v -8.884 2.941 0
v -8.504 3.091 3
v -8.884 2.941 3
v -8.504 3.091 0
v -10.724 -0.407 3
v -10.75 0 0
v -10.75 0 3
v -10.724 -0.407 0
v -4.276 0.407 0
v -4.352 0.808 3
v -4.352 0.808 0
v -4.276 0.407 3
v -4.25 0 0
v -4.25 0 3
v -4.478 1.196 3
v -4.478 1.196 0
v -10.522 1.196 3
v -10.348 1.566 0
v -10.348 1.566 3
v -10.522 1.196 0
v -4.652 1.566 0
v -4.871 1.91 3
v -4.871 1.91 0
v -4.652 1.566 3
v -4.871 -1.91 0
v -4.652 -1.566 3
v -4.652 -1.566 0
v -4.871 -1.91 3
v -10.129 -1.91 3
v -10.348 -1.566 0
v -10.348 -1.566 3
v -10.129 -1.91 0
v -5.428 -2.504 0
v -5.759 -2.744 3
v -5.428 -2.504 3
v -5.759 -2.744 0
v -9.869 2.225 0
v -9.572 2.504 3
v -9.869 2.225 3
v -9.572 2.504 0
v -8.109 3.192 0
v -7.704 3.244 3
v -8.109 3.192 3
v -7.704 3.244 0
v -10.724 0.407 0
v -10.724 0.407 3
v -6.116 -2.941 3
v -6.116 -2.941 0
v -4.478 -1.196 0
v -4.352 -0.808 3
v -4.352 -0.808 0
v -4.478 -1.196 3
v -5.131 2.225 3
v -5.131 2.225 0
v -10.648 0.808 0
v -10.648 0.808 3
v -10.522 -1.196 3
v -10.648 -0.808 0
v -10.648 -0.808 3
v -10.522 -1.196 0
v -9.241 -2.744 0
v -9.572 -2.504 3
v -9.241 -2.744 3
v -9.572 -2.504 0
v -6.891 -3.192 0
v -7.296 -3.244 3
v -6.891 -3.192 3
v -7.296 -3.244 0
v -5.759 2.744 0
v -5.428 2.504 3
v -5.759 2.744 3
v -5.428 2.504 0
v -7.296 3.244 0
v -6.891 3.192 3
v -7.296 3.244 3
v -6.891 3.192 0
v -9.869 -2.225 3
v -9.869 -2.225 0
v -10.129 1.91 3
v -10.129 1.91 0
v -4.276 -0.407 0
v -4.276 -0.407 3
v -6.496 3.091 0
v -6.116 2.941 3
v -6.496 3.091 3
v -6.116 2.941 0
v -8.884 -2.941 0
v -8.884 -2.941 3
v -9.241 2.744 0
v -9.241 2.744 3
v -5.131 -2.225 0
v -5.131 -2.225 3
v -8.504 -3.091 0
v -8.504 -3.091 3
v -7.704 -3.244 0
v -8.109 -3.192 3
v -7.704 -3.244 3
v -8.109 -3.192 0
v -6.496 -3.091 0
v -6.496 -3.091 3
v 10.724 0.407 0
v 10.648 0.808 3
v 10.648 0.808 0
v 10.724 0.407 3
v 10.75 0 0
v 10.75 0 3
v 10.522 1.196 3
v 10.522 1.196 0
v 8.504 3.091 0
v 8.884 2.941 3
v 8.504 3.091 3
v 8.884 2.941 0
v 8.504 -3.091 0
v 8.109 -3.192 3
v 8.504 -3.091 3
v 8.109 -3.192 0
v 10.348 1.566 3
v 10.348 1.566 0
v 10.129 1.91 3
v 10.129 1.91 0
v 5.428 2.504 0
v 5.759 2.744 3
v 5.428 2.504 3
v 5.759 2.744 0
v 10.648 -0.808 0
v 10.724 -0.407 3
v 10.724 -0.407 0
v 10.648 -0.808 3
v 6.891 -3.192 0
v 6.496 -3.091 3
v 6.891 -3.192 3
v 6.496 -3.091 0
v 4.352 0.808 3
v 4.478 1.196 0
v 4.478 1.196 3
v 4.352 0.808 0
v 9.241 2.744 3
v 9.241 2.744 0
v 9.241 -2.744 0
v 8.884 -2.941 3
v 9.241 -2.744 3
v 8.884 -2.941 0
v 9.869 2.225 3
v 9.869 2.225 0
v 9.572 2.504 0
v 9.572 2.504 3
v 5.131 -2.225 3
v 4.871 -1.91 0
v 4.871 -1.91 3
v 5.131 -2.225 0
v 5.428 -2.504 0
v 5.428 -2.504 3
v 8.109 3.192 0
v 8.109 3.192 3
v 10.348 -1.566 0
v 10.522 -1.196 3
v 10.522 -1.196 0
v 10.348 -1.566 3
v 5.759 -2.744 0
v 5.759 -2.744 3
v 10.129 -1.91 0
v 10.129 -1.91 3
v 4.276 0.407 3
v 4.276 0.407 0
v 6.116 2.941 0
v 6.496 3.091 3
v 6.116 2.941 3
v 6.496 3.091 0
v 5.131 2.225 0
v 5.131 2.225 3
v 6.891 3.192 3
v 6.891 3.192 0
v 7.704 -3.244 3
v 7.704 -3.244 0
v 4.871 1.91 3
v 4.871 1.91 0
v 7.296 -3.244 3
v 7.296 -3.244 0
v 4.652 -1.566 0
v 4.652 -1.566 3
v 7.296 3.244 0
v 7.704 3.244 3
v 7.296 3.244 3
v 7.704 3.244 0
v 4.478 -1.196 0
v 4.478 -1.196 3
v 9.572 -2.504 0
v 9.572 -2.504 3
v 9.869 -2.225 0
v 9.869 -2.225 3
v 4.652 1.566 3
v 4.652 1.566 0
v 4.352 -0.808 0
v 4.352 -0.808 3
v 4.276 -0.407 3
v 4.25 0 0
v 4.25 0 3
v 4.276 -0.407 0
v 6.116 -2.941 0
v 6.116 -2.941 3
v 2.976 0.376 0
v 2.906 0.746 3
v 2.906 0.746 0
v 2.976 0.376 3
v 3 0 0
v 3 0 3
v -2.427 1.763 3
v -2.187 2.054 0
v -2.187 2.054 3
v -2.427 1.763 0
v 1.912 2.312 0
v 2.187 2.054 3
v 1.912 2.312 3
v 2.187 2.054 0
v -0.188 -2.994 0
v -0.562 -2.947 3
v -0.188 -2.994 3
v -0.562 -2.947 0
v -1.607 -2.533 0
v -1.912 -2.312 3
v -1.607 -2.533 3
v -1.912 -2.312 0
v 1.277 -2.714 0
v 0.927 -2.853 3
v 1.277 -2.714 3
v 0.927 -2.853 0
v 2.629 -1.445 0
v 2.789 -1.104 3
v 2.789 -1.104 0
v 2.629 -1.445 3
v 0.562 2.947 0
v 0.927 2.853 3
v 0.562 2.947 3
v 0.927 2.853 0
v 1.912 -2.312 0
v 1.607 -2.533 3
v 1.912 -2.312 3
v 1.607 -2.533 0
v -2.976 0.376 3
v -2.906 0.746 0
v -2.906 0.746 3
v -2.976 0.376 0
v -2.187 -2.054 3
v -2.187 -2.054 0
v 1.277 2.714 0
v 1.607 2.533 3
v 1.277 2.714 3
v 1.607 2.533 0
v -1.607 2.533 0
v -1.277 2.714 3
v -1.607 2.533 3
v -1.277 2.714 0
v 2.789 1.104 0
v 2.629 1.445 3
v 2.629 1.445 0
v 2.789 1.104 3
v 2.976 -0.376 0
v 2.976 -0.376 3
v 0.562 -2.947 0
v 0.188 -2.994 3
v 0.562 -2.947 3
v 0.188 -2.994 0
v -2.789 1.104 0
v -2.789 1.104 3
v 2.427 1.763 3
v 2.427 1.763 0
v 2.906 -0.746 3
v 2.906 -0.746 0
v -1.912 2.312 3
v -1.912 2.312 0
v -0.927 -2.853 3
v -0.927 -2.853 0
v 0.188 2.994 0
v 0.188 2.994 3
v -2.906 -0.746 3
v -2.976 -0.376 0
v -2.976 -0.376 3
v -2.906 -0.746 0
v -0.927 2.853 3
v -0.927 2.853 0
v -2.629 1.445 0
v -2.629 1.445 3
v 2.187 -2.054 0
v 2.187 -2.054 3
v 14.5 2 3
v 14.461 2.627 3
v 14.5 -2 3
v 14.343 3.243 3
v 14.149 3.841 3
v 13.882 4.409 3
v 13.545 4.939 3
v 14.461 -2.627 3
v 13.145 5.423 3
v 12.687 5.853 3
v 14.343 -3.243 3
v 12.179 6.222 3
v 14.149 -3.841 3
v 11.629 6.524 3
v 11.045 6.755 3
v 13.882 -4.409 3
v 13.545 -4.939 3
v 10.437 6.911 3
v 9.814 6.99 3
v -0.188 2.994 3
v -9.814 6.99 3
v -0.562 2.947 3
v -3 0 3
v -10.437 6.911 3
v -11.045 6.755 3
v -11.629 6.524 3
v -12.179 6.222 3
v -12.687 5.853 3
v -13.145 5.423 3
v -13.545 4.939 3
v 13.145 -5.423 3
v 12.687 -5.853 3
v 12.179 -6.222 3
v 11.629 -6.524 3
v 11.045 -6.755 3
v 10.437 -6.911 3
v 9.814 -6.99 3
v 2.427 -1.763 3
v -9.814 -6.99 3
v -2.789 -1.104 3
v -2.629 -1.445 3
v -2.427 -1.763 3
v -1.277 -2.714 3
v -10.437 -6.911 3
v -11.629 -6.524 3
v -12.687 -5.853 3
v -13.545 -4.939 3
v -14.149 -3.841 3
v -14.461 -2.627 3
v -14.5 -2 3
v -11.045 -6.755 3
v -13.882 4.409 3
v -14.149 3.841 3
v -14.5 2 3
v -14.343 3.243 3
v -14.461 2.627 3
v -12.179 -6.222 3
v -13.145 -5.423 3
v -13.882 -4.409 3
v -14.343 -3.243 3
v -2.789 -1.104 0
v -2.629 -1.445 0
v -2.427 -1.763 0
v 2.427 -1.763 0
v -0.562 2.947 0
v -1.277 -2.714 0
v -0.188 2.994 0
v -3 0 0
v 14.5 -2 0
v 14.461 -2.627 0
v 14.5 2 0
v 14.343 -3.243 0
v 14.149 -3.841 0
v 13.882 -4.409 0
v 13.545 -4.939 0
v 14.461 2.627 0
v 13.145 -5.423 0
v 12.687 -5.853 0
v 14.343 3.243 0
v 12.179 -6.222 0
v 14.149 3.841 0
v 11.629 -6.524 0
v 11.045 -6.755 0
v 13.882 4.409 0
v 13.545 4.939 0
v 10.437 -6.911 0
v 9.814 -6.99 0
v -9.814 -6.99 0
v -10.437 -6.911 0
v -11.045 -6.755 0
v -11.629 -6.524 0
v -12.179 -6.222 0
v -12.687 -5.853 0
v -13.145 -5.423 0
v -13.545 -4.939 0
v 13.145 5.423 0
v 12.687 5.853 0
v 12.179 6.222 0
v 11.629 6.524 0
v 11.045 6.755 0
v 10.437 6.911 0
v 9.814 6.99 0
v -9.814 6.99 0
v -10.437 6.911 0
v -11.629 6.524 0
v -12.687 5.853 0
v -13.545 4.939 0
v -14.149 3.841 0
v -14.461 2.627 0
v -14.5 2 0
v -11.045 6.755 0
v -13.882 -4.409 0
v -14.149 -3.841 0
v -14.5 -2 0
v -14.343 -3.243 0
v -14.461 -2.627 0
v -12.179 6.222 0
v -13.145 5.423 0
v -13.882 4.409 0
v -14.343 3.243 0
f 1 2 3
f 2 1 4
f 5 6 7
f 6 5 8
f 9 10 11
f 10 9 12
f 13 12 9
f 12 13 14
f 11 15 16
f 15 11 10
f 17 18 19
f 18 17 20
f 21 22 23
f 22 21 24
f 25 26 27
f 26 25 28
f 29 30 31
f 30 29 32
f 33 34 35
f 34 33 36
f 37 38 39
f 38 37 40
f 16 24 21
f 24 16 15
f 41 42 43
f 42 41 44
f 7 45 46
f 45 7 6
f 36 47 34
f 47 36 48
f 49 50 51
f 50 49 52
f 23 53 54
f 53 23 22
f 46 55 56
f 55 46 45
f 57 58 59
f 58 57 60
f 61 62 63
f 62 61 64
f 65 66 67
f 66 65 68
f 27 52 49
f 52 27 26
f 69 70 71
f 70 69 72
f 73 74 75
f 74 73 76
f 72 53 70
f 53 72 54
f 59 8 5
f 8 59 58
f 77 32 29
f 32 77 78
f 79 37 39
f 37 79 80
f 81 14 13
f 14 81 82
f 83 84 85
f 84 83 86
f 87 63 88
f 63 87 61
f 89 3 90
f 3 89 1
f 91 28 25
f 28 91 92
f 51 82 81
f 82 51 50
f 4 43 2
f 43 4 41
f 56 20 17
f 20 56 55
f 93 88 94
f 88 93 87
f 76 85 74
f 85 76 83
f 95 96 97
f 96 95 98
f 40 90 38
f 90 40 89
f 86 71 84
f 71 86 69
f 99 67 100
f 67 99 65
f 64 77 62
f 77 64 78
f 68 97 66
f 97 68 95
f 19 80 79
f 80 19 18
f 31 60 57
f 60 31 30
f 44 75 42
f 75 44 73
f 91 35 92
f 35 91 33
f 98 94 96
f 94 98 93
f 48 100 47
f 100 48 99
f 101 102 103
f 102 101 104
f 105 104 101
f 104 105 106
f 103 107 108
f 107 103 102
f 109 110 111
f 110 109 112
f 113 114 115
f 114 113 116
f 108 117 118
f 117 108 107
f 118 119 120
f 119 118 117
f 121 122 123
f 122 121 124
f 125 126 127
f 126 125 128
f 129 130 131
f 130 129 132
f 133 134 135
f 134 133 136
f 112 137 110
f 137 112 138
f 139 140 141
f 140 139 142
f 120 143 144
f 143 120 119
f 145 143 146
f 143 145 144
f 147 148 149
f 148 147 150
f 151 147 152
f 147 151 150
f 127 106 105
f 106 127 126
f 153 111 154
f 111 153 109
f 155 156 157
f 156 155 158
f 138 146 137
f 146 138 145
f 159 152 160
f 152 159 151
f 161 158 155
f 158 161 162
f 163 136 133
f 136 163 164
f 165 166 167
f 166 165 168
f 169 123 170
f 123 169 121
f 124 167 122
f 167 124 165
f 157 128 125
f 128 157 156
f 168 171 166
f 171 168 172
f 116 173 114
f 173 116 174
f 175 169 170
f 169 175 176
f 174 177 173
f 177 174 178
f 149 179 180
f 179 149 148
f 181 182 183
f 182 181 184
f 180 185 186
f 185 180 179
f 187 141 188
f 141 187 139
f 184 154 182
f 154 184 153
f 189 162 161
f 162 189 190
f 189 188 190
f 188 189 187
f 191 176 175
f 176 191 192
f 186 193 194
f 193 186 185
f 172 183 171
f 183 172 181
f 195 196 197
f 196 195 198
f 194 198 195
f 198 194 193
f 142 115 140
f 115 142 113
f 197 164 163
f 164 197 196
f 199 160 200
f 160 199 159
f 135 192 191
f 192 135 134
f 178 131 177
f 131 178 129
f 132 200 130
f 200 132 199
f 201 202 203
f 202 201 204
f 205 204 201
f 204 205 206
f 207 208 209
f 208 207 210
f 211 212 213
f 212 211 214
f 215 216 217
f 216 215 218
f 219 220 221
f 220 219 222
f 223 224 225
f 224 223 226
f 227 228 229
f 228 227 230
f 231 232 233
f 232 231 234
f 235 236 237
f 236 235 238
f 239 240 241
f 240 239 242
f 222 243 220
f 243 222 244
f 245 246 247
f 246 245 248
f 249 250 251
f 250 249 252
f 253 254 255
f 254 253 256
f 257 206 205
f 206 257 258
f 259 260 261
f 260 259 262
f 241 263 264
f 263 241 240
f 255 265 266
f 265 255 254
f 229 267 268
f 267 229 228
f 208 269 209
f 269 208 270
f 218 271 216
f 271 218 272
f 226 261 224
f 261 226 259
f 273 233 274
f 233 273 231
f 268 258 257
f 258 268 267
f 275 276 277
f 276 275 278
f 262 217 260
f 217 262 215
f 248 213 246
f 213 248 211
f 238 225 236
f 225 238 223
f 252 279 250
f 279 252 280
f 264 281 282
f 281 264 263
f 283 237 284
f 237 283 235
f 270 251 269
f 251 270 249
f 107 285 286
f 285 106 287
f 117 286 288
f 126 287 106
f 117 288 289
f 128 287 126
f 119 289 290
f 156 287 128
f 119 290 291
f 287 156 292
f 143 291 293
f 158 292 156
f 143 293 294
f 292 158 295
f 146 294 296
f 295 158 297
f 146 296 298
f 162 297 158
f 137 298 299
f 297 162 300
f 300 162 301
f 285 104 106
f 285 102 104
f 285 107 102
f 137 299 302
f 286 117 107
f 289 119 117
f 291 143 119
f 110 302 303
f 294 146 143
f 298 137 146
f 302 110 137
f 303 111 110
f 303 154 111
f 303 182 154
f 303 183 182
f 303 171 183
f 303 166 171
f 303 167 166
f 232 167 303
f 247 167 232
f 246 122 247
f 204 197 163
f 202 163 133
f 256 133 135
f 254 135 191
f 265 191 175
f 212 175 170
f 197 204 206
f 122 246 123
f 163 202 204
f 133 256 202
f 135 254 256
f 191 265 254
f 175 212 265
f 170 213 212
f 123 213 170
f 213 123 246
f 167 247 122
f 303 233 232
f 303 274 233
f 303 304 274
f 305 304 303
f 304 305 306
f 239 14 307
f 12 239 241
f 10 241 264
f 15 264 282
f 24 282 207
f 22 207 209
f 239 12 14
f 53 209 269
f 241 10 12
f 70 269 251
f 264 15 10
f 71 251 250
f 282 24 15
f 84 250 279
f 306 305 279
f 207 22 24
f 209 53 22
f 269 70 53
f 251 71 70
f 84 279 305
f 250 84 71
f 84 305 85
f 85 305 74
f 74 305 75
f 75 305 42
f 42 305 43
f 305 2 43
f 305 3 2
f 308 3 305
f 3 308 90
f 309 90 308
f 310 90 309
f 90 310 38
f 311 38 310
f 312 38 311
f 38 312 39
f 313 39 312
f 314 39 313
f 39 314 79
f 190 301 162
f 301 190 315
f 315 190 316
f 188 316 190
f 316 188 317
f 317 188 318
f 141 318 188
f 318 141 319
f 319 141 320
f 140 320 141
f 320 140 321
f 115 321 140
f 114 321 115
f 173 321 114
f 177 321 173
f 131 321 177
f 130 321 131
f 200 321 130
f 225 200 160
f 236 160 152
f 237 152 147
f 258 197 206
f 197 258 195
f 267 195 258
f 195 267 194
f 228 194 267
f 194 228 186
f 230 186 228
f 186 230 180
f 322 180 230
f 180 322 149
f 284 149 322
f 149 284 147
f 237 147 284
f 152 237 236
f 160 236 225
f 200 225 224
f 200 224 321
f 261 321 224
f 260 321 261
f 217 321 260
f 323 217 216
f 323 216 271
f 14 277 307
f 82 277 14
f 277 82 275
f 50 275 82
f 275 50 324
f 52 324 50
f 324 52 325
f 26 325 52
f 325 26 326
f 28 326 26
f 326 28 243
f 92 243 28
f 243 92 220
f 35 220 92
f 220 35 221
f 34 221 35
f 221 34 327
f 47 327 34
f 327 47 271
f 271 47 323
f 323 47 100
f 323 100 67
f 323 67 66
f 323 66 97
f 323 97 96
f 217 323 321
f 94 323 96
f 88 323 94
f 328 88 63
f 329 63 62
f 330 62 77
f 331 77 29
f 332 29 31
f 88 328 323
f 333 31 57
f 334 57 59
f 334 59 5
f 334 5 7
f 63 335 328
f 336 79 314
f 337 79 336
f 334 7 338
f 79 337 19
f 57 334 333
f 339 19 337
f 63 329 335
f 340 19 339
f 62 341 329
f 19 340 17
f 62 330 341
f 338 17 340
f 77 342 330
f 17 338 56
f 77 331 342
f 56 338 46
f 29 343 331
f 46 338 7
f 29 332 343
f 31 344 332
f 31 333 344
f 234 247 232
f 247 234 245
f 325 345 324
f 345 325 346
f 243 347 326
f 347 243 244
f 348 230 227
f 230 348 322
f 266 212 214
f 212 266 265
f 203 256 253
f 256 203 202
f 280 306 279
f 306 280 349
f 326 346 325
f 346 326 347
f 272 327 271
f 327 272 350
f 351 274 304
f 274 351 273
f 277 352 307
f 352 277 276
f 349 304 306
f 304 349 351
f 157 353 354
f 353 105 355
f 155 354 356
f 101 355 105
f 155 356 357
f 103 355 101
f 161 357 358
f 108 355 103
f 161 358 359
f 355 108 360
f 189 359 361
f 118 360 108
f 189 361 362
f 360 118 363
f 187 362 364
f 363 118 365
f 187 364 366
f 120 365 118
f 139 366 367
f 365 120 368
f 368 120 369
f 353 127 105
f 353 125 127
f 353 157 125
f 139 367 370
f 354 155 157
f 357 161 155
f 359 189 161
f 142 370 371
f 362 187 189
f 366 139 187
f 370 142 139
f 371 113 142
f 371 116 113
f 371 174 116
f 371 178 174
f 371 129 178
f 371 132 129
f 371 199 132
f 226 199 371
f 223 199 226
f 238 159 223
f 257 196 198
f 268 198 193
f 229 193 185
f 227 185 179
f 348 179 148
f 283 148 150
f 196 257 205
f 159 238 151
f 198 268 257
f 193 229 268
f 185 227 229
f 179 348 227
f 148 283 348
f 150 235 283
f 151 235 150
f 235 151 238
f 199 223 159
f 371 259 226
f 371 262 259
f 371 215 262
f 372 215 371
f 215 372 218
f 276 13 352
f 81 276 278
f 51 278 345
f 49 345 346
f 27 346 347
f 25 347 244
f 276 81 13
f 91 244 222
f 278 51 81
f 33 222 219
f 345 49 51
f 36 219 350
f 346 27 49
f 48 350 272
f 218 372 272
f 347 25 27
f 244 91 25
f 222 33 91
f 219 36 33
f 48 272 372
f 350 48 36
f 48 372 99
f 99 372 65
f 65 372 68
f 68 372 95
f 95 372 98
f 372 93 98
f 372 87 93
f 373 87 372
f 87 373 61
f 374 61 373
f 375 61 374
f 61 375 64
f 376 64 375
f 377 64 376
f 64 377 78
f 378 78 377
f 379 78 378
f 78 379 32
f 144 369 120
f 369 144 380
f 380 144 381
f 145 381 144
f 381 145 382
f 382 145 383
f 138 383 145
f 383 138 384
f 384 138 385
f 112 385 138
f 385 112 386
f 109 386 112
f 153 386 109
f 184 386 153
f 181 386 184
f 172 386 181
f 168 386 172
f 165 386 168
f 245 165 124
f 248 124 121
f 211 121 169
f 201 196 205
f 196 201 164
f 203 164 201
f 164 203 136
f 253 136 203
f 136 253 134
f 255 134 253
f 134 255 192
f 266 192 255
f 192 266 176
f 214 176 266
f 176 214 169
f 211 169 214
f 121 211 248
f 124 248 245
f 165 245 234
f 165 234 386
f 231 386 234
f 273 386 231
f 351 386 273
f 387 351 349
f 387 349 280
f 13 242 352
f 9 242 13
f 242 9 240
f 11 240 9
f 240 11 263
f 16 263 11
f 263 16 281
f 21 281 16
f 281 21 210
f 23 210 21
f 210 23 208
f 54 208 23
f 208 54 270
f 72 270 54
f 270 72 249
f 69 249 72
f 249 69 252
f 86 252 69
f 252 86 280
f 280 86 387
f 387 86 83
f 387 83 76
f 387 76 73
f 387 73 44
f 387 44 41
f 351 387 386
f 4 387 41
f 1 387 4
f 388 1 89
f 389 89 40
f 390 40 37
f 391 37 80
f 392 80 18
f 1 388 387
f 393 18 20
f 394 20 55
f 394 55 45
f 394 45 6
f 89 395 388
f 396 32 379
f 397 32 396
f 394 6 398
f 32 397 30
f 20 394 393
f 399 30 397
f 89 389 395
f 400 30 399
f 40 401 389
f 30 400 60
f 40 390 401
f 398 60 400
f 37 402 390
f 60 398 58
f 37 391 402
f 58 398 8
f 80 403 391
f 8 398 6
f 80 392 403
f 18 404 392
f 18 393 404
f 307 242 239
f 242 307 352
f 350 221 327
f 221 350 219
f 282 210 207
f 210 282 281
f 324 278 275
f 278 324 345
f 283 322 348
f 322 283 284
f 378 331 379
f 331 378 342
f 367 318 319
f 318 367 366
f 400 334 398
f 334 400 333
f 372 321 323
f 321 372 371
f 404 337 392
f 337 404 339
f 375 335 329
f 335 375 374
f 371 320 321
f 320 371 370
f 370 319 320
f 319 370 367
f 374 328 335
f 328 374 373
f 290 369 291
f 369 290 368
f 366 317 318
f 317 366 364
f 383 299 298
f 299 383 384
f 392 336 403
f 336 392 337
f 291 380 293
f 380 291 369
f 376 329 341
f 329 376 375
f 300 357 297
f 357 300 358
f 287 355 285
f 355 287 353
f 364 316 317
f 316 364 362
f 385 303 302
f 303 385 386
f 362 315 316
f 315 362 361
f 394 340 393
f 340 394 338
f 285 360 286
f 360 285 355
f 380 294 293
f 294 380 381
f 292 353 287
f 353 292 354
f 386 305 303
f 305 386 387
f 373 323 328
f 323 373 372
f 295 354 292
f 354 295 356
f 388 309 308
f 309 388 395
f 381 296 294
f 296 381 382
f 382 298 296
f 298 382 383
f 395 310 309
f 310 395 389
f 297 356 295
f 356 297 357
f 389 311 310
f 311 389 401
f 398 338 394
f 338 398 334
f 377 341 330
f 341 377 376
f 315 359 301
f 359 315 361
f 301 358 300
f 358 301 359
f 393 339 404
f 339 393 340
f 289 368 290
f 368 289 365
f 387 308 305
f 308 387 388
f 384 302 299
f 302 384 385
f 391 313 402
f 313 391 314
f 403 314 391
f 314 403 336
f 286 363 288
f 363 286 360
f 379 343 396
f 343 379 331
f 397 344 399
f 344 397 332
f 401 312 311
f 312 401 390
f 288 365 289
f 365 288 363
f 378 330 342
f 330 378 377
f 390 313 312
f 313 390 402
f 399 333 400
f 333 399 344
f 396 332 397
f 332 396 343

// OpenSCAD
$fn = 50;


difference() {
	union() {
		hull() {
			translate(v = [-9.5000000000, 2.0000000000, 0]) {
				cylinder(h = 3, r = 5);
			}
			translate(v = [9.5000000000, 2.0000000000, 0]) {
				cylinder(h = 3, r = 5);
			}
			translate(v = [-9.5000000000, -2.0000000000, 0]) {
				cylinder(h = 3, r = 5);
			}
			translate(v = [9.5000000000, -2.0000000000, 0]) {
				cylinder(h = 3, r = 5);
			}
		}
	}
	union() {
		#translate(v = [-7.5000000000, 0.0000000000, 0]) {
			cylinder(h = 3, r = 3.2500000000);
		}
		#translate(v = [7.5000000000, 0.0000000000, 0]) {
			cylinder(h = 3, r = 3.2500000000);
		}
		#translate(v = [-7.5000000000, 0.0000000000, -100.0000000000]) {
			cylinder(h = 200, r = 3.2500000000);
		}
		#translate(v = [-7.5000000000, 0.0000000000, -100.0000000000]) {
			cylinder(h = 200, r = 3.2500000000);
		}
		#translate(v = [7.5000000000, 0.0000000000, -100.0000000000]) {
			cylinder(h = 200, r = 3.2500000000);
		}
		#translate(v = [7.5000000000, 0.0000000000, -100.0000000000]) {
			cylinder(h = 200, r = 3.2500000000);
		}
		#translate(v = [-7.5000000000, 0.0000000000, 0]) {
			cylinder(h = 3, r = 1.8000000000);
		}
		#translate(v = [7.5000000000, 0.0000000000, 0]) {
			cylinder(h = 3, r = 1.8000000000);
		}
		#translate(v = [-7.5000000000, 0.0000000000, 0]) {
			cylinder(h = 3, r = 1.8000000000);
		}
		#translate(v = [7.5000000000, 0.0000000000, 0]) {
			cylinder(h = 3, r = 1.8000000000);
		}
		#translate(v = [-7.5000000000, 0.0000000000, 0]) {
			cylinder(h = 3, r = 1.8000000000);
		}
		#translate(v = [7.5000000000, 0.0000000000, 0]) {
			cylinder(h = 3, r = 1.8000000000);
		}
		#cylinder(h = 3, r = 3.0000000000);
	}
}
